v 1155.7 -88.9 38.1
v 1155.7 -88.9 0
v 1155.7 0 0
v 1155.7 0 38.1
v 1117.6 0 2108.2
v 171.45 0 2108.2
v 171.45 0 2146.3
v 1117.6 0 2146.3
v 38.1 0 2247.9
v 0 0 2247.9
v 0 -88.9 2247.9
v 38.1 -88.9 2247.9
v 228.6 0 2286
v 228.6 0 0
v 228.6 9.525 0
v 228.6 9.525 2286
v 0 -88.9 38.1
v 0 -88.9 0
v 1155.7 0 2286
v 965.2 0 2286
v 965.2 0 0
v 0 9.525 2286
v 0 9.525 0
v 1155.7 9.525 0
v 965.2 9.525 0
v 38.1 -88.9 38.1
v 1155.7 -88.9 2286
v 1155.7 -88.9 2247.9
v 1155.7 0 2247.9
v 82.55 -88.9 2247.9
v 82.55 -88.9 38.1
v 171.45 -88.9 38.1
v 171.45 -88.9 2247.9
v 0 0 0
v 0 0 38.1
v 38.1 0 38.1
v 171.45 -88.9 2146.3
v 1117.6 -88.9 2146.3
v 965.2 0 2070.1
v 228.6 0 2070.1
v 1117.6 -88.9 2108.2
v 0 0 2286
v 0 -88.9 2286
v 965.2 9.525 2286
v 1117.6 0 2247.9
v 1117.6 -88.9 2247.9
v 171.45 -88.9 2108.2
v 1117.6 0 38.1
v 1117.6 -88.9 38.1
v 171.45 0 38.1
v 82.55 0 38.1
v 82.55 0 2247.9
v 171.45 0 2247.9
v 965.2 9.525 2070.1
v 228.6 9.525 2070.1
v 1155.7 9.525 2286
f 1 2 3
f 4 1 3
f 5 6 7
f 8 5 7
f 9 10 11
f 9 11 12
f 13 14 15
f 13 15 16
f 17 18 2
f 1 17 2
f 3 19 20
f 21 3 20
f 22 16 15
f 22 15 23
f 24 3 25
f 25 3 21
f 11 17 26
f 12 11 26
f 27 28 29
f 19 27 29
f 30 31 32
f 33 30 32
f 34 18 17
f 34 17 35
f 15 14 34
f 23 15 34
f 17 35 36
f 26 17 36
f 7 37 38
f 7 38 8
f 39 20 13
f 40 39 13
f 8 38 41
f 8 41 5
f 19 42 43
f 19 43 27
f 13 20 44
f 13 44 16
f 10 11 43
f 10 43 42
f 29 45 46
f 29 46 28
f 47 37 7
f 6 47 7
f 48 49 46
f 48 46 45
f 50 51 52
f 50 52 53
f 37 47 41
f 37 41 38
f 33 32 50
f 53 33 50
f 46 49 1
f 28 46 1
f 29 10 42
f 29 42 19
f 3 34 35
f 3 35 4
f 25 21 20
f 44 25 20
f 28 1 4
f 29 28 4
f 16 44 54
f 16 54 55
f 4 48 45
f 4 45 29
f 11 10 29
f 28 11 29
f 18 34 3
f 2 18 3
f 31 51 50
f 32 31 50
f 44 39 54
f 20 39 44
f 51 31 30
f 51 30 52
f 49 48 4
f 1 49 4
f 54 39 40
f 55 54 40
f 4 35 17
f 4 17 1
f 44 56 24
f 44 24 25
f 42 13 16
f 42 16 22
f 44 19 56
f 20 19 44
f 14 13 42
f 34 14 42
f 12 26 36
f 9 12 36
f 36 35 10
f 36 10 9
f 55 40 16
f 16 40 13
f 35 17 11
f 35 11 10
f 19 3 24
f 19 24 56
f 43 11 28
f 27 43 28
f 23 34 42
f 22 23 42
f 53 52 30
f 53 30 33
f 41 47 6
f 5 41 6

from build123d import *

# Parameters (mm, degrees)
F0_W      = 1155.7
F0_H      = 88.9
F1_DEPTH  = 38.1
F2_W      = 38.1
F2_H      = 88.9
F3_DEPTH  = 2209.8
F2_W_2    = 88.9
F4_W      = 1155.7
F4_H      = 88.9
F5_DEPTH  = 38.1
F6_W      = 190.5
F6_H      = 2286
F7_DEPTH  = 9.525
F6_W_2    = 228.6
F8_W      = 736.6
F8_H      = 215.9
F9_DEPTH  = 9.525
F10_W     = 88.9
F10_H     = 38.1
F11_DEPTH = 946.15


with BuildPart() as f1:
    # F0 (on Top) → F1 (new body)
    with BuildSketch(Plane.XY):
        with Locations((577.85, -44.45)):
            Rectangle(F0_W, F0_H)
    extrude(amount=F1_DEPTH)


with BuildPart() as f3:
    # F2 (on face) → F3 (new body)
    with BuildSketch(Plane.XY.offset(38.1)):
        with Locations((19.05, -44.45)):
            Rectangle(F2_W, F2_H)
    extrude(amount=F3_DEPTH)


with BuildPart() as f3b:
    # F2 (on face) → F3, piece 2 (new body)
    with BuildSketch(Plane.XY.offset(38.1)):
        with Locations((1136.65, -44.45)):
            Rectangle(F2_W, F2_H)
    extrude(amount=F3_DEPTH)


with BuildPart() as f3c:
    # F2 (on face) → F3, piece 3 (new body)
    with BuildSketch(Plane.XY.offset(38.1)):
        with Locations((127, -44.45)):
            Rectangle(F2_W_2, F2_H)
    extrude(amount=F3_DEPTH)


with BuildPart() as f5:
    # F4 (on face) → F5 (new body)
    with BuildSketch(Plane.XY.offset(2247.9)):
        with Locations((577.85, -44.45)):
            Rectangle(F4_W, F4_H)
    extrude(amount=F5_DEPTH)


with BuildPart() as f7:
    # F6 (on face) → F7 (new body)
    with BuildSketch(Plane(origin=(0, 0, 0), x_dir=(-1, 0, 0), z_dir=(0, 1, 0))):
        with Locations((-1060.45, 1143)):
            Rectangle(F6_W, F6_H)
    extrude(amount=F7_DEPTH)


with BuildPart() as f7b:
    # F6 (on face) → F7, piece 2 (new body)
    with BuildSketch(Plane(origin=(0, 0, 0), x_dir=(-1, 0, 0), z_dir=(0, 1, 0))):
        with Locations((-114.3, 1143)):
            Rectangle(F6_W_2, F6_H)
    extrude(amount=F7_DEPTH)


with BuildPart() as f9:
    # F8 (on face) → F9 (new body)
    with BuildSketch(Plane(origin=(0, 0, 0), x_dir=(-1, 0, 0), z_dir=(0, 1, 0))):
        with Locations((-596.9, 2178.05)):
            Rectangle(F8_W, F8_H)
    extrude(amount=F9_DEPTH)


with BuildPart() as f11:
    # F10 (on face) → F11 (new body)
    with BuildSketch(Plane.YZ.offset(171.45)):
        with Locations((-44.45, 2127.25)):
            Rectangle(F10_W, F10_H)
    extrude(amount=F11_DEPTH)


solid = Compound([f1.part, f3.part, f3b.part, f3c.part, f5.part, f7.part, f7b.part, f9.part, f11.part])
